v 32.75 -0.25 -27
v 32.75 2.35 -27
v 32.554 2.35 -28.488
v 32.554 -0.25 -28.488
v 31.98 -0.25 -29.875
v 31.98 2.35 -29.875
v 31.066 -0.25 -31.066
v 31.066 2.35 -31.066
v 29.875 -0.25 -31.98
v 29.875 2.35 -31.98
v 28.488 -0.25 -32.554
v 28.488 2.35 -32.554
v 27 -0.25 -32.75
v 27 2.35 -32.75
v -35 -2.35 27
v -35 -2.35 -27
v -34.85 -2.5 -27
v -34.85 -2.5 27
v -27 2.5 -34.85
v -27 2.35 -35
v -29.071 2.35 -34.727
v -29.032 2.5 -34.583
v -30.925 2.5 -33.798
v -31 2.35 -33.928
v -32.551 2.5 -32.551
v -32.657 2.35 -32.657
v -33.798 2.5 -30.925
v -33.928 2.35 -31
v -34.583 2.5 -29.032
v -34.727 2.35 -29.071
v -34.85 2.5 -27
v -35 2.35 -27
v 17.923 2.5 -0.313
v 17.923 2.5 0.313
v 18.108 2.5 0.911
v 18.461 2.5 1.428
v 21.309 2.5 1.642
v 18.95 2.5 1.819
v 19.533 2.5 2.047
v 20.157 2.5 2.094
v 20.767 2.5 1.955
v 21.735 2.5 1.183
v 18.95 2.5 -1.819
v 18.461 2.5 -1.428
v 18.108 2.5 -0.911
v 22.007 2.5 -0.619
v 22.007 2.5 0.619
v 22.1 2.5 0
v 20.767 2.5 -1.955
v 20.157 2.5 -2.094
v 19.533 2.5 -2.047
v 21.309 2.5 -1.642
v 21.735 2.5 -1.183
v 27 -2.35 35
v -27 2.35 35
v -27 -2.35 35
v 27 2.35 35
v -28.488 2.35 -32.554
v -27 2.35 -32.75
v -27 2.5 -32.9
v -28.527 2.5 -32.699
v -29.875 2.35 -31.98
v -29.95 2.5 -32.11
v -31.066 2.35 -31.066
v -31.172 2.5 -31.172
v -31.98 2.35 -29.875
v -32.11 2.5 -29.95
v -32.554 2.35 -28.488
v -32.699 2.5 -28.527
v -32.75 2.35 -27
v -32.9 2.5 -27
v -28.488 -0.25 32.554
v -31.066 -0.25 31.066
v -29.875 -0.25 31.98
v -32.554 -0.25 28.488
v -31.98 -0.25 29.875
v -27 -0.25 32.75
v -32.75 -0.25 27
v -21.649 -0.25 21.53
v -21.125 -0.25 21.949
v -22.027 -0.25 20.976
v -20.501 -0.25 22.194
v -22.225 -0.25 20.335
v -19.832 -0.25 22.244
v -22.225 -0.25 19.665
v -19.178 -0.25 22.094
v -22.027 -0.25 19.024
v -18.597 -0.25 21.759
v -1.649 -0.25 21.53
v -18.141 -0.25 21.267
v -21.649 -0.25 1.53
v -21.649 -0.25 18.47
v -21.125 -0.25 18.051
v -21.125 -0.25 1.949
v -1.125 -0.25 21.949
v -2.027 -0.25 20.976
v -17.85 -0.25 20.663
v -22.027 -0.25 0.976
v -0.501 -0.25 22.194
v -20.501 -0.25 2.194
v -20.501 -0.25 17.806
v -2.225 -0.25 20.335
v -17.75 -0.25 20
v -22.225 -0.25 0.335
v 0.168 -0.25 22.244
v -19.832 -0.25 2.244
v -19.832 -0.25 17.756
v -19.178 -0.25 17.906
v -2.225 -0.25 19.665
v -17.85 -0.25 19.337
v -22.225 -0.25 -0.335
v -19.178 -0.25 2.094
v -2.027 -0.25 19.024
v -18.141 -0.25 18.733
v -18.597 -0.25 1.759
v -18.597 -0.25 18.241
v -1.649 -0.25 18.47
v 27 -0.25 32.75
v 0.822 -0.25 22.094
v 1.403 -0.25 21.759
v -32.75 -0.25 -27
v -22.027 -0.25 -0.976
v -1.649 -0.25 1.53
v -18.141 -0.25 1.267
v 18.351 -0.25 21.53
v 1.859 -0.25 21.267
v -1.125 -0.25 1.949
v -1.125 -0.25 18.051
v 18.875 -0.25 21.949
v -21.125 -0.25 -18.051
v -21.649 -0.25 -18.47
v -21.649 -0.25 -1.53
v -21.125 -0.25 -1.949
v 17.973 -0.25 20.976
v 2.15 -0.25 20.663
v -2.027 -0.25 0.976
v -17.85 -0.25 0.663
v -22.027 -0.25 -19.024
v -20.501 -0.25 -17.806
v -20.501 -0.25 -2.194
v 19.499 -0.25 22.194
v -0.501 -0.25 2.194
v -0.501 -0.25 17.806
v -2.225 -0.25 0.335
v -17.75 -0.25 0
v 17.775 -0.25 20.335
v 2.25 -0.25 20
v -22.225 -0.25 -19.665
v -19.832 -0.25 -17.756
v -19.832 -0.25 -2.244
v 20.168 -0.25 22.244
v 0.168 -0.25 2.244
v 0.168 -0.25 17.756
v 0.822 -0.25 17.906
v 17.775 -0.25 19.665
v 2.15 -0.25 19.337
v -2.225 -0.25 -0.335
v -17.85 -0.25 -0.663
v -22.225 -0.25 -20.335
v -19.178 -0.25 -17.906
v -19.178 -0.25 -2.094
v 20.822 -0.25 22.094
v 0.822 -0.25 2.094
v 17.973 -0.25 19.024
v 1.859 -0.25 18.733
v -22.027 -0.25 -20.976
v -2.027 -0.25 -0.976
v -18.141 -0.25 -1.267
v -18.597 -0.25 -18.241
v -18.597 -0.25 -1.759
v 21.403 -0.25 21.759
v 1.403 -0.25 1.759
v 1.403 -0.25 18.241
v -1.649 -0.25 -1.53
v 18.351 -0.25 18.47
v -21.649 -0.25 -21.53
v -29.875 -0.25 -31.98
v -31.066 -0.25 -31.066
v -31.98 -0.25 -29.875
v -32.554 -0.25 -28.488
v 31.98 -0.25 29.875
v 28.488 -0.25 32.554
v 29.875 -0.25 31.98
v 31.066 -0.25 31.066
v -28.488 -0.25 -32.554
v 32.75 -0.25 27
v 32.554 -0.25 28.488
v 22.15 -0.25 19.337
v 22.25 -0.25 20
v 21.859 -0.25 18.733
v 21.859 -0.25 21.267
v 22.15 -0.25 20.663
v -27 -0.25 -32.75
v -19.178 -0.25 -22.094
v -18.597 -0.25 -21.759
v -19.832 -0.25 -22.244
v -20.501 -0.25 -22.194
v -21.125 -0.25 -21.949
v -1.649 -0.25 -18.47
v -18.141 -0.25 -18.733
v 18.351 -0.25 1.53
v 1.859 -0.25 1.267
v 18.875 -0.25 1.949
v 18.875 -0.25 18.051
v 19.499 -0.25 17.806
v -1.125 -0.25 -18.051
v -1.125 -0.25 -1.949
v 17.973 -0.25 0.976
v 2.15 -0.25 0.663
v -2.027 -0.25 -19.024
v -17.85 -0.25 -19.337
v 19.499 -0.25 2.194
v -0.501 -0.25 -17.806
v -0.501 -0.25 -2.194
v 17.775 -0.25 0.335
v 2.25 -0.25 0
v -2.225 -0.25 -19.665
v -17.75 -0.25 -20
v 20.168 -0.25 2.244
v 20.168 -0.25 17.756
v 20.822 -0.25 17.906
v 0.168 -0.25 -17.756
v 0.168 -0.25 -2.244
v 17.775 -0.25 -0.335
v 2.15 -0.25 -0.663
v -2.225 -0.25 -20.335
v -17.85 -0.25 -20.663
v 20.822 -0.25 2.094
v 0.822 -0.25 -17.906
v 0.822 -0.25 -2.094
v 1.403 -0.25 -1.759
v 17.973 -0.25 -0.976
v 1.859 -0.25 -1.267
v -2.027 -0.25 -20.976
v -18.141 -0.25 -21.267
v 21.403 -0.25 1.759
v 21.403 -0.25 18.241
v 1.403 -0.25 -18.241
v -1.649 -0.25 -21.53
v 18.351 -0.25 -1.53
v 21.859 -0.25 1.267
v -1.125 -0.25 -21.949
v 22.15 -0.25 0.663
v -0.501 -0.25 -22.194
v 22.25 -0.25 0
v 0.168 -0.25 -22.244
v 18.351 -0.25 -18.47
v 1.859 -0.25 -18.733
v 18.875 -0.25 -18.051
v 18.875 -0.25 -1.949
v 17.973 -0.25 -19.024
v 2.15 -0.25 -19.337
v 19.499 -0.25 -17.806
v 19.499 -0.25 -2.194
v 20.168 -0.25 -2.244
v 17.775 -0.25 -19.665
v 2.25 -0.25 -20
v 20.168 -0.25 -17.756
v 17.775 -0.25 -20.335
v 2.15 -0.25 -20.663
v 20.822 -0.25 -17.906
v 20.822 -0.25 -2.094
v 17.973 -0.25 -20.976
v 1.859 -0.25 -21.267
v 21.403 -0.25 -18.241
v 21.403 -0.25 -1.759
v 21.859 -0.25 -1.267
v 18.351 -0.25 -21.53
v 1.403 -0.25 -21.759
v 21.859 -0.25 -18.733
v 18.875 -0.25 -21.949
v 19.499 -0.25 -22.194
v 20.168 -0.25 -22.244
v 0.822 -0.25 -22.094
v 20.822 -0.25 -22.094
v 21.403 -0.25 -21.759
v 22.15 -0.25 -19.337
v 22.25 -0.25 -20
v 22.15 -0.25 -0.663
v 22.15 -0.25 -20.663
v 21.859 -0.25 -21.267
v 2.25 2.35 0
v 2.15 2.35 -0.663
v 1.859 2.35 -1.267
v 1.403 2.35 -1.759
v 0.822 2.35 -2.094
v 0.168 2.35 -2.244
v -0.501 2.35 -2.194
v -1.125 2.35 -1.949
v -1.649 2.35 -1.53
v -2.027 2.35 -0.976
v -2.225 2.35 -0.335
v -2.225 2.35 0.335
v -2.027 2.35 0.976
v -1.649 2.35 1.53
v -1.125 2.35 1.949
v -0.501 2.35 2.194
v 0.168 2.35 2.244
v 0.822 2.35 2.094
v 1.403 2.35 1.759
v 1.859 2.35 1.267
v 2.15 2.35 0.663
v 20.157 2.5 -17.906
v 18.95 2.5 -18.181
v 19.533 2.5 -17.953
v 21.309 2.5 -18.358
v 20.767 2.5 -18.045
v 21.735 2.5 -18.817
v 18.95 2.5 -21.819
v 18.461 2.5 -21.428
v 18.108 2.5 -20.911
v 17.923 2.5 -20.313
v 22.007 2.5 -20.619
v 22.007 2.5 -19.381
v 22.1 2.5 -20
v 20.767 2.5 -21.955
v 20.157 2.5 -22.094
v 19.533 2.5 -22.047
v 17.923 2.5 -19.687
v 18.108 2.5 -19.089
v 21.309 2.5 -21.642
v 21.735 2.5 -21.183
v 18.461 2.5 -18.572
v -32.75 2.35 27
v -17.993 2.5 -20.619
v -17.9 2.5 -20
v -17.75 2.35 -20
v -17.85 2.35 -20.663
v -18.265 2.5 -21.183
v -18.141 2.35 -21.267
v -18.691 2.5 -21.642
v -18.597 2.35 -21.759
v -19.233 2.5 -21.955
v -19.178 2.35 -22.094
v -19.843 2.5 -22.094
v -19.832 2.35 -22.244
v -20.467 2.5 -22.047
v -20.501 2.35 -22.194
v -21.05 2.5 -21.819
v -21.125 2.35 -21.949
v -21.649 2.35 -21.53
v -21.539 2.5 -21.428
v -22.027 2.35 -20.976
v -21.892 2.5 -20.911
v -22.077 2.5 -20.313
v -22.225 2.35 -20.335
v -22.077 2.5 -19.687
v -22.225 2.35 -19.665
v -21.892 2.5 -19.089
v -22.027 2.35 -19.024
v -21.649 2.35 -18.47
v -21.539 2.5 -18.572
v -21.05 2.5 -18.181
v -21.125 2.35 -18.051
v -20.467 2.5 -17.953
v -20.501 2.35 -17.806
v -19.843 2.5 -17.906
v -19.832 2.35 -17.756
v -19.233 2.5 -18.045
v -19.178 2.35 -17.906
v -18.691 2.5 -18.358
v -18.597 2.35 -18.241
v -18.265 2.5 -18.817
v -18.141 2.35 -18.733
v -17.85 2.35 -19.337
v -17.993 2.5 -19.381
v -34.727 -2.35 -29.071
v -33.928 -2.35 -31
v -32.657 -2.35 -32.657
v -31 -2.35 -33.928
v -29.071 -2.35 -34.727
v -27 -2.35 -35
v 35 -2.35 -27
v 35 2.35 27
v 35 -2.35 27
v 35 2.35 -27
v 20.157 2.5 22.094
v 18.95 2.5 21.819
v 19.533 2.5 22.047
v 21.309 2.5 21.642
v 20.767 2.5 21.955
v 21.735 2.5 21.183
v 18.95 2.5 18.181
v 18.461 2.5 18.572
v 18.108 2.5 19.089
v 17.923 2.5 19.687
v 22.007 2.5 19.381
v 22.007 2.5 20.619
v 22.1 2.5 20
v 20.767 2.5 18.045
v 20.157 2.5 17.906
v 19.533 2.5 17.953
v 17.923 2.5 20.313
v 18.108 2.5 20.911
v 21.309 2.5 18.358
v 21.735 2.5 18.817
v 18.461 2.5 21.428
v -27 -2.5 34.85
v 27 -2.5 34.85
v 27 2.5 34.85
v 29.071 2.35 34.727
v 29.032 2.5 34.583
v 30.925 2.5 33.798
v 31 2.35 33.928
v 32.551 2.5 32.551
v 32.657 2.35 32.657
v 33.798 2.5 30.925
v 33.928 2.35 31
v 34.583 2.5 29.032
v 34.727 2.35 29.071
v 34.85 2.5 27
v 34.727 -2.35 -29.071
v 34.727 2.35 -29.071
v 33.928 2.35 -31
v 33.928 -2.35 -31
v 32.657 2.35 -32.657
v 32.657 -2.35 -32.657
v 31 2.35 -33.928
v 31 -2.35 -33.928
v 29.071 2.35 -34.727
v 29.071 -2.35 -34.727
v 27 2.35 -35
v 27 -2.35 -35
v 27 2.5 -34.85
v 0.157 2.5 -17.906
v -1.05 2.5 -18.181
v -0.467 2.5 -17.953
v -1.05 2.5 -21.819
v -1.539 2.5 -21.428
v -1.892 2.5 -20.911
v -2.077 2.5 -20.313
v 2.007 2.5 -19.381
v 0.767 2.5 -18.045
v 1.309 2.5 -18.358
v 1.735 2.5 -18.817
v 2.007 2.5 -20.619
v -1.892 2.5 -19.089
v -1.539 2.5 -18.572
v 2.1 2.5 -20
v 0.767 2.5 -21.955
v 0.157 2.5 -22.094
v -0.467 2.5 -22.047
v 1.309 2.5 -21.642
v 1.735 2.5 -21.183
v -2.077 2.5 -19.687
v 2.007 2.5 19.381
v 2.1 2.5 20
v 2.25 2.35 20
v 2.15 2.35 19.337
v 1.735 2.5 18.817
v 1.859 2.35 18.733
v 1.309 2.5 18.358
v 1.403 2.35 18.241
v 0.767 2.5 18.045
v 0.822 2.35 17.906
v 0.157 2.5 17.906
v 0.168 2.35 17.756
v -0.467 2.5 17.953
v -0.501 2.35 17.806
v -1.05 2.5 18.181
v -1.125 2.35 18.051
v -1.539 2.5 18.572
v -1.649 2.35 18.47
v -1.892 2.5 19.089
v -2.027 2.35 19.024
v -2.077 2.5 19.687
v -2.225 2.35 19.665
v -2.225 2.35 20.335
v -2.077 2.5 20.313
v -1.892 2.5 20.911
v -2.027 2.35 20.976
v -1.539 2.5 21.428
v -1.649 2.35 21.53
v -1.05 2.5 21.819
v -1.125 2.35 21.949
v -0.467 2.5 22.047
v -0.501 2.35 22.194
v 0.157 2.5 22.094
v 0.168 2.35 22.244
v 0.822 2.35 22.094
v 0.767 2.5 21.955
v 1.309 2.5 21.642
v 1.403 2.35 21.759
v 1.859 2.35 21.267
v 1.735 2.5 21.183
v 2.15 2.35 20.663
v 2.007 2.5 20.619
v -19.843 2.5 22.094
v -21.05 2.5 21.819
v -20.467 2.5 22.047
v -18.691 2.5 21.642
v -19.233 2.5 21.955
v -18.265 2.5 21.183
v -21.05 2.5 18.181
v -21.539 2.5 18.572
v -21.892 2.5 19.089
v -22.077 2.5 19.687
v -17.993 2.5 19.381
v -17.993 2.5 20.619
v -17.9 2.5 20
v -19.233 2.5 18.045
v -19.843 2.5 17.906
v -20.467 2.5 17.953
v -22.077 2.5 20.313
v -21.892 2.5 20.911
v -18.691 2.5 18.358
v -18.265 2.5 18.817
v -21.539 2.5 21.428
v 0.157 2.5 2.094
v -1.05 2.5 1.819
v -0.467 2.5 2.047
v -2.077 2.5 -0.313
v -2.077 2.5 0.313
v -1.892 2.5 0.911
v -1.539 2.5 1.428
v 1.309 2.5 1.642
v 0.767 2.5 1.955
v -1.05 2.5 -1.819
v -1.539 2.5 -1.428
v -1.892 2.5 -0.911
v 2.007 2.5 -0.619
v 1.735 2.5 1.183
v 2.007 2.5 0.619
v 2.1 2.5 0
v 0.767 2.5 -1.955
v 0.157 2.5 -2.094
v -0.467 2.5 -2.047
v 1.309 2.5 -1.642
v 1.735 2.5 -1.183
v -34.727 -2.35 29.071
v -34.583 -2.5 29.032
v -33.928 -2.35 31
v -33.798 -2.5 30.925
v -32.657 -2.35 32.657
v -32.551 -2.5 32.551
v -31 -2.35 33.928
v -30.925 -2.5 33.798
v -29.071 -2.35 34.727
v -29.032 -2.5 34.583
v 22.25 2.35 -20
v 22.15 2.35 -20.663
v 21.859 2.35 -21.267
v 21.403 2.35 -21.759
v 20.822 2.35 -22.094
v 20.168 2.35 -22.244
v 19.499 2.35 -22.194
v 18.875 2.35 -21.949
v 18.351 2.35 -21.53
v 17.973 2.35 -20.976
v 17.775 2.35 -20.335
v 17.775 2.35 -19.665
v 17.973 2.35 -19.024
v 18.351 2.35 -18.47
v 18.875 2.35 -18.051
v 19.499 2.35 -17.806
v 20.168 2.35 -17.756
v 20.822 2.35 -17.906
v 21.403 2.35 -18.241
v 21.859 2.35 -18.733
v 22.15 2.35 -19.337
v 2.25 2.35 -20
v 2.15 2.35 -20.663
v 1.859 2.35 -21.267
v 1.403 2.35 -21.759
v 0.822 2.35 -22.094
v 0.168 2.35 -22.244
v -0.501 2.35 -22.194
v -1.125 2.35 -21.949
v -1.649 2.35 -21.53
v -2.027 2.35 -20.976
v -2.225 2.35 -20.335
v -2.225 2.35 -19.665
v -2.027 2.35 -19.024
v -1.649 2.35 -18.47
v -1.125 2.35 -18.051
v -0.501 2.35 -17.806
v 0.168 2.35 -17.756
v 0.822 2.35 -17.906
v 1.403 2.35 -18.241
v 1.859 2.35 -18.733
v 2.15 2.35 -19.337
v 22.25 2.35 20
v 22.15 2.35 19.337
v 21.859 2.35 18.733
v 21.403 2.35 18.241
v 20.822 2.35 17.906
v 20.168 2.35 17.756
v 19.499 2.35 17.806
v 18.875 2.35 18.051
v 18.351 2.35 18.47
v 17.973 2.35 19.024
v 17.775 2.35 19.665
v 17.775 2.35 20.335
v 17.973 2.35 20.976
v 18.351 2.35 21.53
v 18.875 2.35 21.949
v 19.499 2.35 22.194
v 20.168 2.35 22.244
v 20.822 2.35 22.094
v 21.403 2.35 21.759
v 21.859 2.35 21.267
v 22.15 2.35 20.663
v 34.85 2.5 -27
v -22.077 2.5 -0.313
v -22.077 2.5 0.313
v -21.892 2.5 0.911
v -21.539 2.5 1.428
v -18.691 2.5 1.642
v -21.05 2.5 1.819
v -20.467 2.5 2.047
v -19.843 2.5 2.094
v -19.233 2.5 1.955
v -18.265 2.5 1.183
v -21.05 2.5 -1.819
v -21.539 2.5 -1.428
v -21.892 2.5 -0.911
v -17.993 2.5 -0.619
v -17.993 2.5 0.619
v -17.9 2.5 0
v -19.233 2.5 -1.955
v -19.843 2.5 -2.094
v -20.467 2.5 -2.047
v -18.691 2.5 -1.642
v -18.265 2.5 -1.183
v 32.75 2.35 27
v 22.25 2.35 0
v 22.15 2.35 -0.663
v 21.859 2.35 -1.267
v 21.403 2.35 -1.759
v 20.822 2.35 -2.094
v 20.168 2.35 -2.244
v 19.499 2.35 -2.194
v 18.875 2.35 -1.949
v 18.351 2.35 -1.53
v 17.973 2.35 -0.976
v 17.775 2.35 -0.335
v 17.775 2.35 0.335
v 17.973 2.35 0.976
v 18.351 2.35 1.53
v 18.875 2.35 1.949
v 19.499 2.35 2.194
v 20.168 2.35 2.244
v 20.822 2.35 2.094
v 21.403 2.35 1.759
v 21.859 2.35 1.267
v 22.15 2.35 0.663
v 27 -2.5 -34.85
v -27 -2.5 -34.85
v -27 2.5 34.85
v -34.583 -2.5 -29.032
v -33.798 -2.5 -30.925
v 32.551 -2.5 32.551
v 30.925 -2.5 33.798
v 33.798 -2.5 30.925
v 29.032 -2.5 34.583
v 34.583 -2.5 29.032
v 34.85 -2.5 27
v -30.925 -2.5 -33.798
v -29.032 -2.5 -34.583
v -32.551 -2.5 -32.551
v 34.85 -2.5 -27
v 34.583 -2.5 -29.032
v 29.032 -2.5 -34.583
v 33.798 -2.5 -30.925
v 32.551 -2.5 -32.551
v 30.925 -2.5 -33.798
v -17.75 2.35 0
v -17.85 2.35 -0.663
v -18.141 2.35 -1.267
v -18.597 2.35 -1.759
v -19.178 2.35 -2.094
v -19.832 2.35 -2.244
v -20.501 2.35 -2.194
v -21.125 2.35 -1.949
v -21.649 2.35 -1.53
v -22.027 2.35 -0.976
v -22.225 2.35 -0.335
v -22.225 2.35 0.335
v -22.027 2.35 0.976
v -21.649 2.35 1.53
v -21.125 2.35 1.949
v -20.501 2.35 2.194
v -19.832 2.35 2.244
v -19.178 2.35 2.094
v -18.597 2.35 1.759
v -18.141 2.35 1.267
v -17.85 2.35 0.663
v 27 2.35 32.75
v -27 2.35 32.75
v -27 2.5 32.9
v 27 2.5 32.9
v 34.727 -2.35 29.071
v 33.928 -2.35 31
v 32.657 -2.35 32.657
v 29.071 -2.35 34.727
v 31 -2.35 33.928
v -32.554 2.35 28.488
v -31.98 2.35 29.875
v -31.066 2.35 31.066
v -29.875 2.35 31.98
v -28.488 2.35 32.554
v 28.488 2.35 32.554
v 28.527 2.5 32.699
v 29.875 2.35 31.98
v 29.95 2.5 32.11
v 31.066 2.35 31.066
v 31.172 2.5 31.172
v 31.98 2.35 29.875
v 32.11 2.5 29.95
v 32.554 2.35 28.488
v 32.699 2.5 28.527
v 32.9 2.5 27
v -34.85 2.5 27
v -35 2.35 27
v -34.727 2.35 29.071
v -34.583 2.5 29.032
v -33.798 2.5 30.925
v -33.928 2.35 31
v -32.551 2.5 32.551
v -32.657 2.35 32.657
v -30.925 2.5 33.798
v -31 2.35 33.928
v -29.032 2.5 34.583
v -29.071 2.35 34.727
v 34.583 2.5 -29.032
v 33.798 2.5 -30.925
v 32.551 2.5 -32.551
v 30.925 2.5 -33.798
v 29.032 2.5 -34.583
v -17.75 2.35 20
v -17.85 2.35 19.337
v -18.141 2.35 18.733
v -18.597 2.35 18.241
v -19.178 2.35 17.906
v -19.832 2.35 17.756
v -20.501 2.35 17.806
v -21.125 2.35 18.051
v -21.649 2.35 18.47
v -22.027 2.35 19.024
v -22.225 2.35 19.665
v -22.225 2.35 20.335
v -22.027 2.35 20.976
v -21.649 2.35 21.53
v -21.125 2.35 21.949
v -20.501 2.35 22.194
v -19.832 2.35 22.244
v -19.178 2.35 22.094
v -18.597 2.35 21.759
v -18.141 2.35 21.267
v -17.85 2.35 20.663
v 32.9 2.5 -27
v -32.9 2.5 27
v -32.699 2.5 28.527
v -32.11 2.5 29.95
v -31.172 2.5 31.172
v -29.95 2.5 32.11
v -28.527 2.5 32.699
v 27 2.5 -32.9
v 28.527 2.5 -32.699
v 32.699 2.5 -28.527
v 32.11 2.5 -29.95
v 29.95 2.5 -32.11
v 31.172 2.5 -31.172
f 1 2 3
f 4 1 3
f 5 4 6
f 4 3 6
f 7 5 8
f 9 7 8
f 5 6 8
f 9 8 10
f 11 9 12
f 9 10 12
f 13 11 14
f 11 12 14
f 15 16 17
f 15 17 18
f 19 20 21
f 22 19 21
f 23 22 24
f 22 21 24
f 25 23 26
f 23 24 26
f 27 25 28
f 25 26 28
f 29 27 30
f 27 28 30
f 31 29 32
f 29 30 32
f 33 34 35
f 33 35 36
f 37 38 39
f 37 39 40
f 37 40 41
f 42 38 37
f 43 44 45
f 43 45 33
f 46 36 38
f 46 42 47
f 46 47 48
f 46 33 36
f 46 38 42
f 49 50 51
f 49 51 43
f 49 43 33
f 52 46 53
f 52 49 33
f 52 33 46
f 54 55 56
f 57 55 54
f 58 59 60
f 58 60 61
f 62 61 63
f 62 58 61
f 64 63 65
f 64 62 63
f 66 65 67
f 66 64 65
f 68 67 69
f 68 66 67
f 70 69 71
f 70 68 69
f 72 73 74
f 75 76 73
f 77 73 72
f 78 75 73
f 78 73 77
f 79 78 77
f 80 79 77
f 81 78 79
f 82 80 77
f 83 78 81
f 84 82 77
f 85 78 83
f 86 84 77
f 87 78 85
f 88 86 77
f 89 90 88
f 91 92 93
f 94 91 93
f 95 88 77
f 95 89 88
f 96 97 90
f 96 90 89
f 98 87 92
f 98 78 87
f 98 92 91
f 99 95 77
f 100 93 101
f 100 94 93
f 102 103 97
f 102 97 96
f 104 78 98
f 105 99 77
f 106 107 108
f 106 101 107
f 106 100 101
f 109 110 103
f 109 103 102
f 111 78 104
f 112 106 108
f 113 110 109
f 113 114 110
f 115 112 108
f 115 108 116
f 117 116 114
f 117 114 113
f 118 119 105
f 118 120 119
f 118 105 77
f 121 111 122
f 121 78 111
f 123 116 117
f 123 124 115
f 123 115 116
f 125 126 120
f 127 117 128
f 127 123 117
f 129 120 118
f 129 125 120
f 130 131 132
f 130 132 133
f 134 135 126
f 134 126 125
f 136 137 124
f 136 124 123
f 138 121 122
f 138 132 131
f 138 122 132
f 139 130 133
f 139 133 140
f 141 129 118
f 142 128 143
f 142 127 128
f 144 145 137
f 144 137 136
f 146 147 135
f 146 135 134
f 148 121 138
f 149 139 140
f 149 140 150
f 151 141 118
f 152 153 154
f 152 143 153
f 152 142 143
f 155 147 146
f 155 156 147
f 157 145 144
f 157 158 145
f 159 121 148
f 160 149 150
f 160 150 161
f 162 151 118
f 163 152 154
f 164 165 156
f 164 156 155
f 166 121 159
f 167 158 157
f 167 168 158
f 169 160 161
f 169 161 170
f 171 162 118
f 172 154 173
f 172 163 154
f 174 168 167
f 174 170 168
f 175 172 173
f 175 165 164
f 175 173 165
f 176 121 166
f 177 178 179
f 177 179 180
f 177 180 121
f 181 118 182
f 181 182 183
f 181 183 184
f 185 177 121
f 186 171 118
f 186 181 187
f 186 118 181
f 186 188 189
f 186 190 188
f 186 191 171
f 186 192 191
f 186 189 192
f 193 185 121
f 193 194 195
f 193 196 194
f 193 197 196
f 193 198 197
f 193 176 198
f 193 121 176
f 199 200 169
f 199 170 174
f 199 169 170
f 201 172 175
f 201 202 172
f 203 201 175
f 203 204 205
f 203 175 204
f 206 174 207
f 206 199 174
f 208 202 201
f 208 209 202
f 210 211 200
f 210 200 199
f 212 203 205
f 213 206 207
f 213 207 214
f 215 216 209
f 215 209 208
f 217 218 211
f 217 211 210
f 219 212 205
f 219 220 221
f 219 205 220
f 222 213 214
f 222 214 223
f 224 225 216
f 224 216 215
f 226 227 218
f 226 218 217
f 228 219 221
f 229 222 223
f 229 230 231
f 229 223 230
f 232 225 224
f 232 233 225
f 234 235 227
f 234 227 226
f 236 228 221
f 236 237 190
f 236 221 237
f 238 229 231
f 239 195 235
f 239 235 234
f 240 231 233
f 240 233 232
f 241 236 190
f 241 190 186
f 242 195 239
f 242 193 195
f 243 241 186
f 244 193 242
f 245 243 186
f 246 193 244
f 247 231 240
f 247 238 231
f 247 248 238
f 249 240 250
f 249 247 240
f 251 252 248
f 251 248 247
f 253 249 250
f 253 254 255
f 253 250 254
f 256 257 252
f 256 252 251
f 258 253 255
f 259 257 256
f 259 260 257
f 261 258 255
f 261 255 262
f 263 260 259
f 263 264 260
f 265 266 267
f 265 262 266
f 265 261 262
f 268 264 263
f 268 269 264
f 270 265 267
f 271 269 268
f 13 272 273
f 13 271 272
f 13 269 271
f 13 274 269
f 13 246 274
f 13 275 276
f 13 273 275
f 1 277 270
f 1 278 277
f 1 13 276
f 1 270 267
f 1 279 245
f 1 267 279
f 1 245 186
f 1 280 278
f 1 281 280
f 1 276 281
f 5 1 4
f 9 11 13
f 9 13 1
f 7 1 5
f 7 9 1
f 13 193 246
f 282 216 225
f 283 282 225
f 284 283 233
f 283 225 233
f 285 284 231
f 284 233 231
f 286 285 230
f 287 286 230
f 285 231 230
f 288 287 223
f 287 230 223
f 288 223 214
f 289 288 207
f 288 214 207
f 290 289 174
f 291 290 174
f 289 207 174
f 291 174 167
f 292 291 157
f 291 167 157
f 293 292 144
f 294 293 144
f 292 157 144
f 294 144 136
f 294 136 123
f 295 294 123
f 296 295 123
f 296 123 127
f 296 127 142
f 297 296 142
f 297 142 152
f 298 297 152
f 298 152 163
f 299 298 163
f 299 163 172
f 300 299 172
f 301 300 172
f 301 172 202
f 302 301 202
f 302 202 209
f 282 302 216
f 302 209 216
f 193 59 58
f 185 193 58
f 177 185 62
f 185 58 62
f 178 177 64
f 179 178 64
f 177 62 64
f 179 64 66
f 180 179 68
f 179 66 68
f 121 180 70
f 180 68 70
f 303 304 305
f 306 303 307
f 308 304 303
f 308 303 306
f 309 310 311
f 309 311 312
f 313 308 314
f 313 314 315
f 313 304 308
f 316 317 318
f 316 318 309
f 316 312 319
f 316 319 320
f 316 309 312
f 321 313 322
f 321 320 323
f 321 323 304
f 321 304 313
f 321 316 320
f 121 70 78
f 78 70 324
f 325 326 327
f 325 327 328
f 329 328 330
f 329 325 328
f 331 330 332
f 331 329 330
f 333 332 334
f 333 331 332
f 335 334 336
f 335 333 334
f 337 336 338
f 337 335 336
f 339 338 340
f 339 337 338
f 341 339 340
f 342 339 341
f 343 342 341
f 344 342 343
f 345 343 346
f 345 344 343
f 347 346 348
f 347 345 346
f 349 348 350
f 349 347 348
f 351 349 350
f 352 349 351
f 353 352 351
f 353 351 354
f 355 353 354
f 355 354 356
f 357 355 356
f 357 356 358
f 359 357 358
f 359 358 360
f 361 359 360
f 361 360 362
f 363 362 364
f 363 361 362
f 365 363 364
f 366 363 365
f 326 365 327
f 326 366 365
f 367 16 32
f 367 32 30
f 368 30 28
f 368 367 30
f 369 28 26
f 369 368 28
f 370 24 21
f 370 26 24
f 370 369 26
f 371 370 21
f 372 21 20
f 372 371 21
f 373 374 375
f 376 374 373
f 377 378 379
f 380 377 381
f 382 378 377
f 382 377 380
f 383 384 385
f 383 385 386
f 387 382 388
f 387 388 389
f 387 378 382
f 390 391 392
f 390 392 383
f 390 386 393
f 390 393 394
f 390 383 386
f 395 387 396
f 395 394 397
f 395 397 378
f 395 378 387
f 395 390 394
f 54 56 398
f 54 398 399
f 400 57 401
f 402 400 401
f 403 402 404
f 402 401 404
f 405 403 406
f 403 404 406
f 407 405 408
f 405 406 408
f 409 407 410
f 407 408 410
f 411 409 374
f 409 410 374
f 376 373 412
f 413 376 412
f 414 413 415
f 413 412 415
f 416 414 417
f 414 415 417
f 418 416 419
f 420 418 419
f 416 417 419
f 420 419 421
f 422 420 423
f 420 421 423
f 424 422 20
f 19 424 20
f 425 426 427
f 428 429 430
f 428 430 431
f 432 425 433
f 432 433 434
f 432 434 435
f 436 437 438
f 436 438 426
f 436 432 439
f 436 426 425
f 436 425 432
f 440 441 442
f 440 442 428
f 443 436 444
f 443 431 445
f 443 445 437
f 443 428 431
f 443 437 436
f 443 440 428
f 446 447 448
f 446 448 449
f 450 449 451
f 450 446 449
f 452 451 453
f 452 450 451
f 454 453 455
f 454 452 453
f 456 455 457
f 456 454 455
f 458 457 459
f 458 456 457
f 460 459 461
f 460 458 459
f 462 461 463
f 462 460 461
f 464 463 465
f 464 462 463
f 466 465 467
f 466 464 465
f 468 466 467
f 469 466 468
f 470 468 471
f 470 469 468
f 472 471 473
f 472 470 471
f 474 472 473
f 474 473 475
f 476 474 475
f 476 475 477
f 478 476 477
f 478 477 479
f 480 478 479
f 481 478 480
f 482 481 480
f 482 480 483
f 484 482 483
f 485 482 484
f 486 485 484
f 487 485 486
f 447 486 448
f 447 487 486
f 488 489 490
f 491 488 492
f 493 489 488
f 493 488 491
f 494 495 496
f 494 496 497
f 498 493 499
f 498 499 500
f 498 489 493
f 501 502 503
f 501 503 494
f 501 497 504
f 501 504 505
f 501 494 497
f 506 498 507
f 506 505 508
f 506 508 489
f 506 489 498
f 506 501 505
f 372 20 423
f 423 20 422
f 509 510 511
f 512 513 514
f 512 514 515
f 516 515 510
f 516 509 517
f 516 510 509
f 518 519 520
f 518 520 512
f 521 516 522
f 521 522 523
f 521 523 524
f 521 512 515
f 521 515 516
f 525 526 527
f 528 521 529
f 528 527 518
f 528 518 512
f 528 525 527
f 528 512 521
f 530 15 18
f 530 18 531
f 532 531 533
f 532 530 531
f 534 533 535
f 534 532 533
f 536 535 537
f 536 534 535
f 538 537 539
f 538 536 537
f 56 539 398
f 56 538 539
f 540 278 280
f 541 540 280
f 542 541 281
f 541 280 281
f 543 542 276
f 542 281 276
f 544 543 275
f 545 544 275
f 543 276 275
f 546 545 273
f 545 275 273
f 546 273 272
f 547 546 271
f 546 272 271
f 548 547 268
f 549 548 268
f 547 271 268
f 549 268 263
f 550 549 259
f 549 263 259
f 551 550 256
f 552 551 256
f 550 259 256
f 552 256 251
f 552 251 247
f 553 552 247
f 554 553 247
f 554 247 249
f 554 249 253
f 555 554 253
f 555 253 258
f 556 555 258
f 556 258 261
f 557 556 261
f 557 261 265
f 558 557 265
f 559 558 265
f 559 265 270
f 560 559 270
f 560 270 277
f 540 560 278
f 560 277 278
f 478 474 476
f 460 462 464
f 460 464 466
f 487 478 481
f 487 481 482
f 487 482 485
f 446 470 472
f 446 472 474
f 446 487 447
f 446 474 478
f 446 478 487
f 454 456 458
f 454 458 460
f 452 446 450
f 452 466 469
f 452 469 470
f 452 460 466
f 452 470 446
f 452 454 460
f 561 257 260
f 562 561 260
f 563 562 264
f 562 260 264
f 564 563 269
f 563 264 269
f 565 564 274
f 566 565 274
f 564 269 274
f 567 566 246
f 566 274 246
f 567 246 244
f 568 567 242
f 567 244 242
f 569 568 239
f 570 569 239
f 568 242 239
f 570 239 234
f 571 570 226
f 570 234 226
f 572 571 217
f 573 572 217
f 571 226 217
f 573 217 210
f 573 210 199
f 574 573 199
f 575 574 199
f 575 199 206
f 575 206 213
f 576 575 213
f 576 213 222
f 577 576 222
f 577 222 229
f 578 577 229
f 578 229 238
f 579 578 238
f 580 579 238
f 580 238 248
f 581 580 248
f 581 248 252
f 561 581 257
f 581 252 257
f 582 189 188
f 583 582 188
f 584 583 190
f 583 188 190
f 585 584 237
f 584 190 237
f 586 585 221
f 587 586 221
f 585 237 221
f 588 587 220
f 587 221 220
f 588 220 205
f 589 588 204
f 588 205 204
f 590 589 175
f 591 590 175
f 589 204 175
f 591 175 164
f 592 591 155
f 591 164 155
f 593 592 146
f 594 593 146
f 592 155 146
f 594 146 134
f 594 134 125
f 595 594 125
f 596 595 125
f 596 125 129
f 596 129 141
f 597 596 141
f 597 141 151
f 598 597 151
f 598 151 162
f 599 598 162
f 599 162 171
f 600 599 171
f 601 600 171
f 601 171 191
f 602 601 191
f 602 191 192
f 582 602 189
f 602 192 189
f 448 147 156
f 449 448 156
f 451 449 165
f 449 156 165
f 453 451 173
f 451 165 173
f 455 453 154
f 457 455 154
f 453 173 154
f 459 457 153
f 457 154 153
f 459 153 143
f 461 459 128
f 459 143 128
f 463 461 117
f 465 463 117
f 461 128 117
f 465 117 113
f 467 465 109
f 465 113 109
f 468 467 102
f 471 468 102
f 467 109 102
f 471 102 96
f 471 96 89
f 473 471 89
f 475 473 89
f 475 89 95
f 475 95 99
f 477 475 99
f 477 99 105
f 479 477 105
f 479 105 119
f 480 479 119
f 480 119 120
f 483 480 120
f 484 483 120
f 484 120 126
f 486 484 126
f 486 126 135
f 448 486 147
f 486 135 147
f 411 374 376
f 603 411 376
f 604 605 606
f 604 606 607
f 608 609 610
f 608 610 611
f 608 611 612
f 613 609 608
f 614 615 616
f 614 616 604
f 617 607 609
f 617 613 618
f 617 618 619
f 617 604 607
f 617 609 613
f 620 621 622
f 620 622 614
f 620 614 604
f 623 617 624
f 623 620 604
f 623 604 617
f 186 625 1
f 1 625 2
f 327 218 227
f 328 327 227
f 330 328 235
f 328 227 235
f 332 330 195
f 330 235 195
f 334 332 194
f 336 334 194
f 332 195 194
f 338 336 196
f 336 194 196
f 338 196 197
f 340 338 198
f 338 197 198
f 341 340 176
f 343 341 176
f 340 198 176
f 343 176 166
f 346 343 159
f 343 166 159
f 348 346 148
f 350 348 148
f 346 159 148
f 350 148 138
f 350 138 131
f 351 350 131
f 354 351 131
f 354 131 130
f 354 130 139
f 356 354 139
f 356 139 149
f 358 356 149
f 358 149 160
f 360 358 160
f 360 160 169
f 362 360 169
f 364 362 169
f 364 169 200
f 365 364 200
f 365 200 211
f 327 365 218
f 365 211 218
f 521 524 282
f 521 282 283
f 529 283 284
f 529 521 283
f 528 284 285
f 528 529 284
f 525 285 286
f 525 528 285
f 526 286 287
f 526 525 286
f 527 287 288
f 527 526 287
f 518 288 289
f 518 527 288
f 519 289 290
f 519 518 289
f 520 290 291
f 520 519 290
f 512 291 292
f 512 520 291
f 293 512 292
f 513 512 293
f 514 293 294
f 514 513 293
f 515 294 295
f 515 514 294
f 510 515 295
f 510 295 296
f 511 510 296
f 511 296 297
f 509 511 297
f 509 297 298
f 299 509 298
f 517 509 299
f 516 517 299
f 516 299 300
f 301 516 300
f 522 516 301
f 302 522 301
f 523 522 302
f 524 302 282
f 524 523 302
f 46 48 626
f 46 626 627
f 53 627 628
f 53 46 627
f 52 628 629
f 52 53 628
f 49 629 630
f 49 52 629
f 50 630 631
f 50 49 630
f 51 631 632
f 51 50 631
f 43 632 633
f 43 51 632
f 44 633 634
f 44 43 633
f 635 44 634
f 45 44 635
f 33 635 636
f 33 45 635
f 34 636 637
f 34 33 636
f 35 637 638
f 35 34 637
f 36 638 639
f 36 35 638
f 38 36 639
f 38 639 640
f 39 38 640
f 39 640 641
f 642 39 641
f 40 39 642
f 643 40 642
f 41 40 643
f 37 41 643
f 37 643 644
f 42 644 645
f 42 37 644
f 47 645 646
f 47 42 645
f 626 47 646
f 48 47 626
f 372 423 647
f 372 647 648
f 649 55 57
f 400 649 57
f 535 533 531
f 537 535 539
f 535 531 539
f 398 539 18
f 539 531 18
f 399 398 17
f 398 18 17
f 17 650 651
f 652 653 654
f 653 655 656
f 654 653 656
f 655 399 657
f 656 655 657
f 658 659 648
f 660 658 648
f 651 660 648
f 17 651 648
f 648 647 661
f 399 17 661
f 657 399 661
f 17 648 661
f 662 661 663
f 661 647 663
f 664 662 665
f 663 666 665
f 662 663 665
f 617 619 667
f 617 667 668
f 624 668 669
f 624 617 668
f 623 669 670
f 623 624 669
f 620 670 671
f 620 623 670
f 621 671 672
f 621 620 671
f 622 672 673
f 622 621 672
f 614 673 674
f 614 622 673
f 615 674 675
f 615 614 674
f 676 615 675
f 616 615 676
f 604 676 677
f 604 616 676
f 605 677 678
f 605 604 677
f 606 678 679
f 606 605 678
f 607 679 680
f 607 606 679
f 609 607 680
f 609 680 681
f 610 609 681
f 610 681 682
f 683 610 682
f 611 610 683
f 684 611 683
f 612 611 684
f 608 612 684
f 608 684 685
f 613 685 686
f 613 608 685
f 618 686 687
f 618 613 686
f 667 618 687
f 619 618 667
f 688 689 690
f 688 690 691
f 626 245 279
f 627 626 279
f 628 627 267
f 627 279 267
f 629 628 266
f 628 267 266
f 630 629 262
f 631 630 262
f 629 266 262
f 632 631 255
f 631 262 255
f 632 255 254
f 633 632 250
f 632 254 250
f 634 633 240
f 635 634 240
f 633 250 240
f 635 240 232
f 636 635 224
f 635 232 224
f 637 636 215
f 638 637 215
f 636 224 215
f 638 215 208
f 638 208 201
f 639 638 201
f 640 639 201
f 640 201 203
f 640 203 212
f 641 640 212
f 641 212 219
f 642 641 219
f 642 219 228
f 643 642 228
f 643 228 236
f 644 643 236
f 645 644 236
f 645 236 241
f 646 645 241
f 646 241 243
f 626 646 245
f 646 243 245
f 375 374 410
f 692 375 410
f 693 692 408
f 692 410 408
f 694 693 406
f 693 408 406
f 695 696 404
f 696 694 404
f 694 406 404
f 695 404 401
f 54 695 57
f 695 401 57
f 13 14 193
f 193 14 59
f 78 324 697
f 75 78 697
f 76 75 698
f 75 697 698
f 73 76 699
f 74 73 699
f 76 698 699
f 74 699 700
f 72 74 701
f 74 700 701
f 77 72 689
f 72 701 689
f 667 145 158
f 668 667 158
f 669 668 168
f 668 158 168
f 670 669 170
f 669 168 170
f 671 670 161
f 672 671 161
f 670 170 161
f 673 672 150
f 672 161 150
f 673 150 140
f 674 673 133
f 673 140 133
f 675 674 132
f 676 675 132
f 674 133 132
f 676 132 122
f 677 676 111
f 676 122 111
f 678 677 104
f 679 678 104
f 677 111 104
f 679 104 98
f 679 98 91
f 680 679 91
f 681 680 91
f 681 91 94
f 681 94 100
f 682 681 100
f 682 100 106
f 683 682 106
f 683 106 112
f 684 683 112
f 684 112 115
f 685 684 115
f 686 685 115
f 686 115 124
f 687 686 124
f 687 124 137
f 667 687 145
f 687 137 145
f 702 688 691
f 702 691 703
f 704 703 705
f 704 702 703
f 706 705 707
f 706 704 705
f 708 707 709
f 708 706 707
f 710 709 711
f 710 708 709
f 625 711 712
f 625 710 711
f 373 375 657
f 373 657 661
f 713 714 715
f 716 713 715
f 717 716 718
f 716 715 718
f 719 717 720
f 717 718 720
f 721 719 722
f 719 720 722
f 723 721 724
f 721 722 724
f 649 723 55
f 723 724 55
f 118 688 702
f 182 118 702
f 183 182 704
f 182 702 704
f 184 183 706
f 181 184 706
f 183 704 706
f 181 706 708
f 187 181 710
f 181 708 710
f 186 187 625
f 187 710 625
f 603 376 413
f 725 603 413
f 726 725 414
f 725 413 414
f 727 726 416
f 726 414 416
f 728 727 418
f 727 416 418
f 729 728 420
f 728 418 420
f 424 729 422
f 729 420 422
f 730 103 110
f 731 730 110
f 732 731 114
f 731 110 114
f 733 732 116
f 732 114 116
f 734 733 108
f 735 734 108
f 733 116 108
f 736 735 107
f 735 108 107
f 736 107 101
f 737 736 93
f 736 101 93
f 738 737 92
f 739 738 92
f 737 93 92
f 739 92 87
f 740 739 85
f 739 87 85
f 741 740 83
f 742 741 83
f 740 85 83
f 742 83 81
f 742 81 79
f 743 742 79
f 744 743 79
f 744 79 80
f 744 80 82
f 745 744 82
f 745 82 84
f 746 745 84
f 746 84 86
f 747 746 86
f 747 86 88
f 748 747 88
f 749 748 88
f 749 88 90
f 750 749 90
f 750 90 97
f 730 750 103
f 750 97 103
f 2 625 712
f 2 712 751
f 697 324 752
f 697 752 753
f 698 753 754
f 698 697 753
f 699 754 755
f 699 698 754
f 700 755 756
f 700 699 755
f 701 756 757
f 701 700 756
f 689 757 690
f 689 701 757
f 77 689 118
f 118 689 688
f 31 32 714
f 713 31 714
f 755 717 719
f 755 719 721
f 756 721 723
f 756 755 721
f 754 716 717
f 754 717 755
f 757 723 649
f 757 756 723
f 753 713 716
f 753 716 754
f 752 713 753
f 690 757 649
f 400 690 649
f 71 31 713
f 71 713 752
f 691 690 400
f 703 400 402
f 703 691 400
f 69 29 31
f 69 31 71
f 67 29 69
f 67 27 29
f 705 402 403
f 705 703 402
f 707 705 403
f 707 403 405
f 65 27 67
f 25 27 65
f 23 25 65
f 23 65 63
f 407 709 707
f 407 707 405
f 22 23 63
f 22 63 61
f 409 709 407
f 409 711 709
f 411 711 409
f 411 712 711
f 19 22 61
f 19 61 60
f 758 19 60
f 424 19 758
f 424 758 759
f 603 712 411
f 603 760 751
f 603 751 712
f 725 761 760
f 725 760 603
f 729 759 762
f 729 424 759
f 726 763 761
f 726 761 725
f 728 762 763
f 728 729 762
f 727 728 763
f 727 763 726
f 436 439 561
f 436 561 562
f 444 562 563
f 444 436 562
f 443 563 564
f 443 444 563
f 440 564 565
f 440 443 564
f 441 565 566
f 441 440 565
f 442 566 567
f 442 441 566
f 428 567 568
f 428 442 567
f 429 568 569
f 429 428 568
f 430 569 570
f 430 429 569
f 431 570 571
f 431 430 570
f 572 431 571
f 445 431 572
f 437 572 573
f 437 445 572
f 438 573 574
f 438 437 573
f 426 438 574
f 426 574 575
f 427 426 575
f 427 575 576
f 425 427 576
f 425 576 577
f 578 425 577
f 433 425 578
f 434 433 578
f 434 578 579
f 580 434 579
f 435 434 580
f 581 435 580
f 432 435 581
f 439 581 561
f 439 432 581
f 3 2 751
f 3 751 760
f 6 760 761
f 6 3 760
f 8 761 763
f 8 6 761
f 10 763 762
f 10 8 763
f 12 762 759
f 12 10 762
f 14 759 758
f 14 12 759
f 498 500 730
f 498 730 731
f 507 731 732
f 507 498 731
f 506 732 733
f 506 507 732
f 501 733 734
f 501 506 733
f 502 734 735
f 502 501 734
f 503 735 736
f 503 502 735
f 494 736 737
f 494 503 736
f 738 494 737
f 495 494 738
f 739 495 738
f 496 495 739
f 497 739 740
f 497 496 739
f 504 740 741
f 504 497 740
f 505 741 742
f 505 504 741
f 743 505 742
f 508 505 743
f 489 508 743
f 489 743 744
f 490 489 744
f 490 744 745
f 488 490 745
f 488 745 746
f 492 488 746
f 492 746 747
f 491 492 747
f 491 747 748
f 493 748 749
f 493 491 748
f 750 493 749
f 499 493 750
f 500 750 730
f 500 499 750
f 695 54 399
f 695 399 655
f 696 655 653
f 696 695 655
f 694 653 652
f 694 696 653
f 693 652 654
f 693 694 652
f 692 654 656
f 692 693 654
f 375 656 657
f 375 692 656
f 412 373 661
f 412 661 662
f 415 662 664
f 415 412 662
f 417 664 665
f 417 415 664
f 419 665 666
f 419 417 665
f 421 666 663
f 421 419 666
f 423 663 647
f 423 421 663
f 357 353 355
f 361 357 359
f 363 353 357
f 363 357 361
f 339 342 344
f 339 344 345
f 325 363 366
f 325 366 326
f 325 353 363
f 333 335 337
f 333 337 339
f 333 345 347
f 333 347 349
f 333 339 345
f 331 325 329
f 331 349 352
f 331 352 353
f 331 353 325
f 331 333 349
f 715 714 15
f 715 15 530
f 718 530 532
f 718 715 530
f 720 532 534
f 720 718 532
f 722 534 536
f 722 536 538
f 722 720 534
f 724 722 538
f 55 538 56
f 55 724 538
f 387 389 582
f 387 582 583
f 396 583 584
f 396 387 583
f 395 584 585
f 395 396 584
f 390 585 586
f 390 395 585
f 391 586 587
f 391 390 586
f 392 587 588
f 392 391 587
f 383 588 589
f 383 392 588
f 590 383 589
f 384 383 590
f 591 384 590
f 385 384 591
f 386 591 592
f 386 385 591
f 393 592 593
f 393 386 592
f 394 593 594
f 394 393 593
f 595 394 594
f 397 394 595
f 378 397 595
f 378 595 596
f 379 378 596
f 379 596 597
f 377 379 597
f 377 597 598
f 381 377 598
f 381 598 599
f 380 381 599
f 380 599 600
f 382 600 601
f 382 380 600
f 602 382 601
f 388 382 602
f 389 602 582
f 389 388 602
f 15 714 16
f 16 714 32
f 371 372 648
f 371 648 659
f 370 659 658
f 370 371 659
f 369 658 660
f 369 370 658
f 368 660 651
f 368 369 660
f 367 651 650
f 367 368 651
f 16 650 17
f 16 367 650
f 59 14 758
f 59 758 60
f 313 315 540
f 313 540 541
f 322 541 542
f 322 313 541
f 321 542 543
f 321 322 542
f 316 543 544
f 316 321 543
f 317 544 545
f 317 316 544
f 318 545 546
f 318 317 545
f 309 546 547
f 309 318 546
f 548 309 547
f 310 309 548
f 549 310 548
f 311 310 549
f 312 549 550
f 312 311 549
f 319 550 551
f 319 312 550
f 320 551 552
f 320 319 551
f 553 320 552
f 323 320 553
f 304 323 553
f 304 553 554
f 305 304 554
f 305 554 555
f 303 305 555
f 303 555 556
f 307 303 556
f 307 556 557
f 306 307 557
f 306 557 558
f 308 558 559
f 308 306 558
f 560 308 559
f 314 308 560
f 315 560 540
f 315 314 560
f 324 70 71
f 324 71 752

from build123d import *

# Parameters (mm, degrees)
SKETCH1_W           = 70
SKETCH1_H           = 70
BOSS_EXTRUDE1_DEPTH = 2.5
FILLET1_R           = 8
CUT_EXTRUDE1_DEPTH  = 2.75
SKETCH3_R           = 2.25
BOSS_EXTRUDE2_DEPTH = 2.75
CHAMFER1_SIZE       = 0.15


with BuildPart() as part:
    # Sketch1 → Boss-Extrude1 (new body, symmetric)
    with BuildSketch(Plane(origin=(0, 0, 0), x_dir=(1, 0, 0), z_dir=(0, 1, 0))):
        Rectangle(SKETCH1_W, SKETCH1_H)
    extrude(amount=BOSS_EXTRUDE1_DEPTH, both=True)

    # Fillet1
    fillet1_edges = [part.edges().sort_by_distance(p)[0] for p in [
        (35, 0, 35),
        (-35, 0, 35),
        (-35, 0, -35),
        (35, 0, -35),
    ]]
    fillet(fillet1_edges, radius=FILLET1_R)

    # Sketch2 → Cut-Extrude1 (cut)
    with BuildSketch(Plane(origin=(0, 2.5, 0), x_dir=(1, 0, 0), z_dir=(0, 1, 0))):
        with BuildLine():
            Line((32.75, -27), (32.75, 27))
            ThreePointArc((32.75, 27), (31.065863992, 31.065863992), (27, 32.75))
            Line((27, 32.75), (-27, 32.75))
            ThreePointArc((-27, 32.75), (-31.065863992, 31.065863992), (-32.75, 27))
            Line((-32.75, 27), (-32.75, -27))
            ThreePointArc((-32.75, -27), (-31.065863992, -31.065863992), (-27, -32.75))
            Line((-27, -32.75), (27, -32.75))
            ThreePointArc((27, -32.75), (31.065863992, -31.065863992), (32.75, -27))
        make_face()
    extrude(amount=-CUT_EXTRUDE1_DEPTH, mode=Mode.SUBTRACT)

    # Sketch3 → Boss-Extrude2 (add)
    with BuildSketch(Plane(origin=(0, -0.25, 0), x_dir=(1, 0, 0), z_dir=(0, 1, 0))):
        with Locations((-20, 20)):
            Circle(SKETCH3_R)
        with Locations((0, 20)):
            Circle(SKETCH3_R)
        with Locations((20, 20)):
            Circle(SKETCH3_R)
        Circle(SKETCH3_R)
        with Locations((20, 0)):
            Circle(SKETCH3_R)
        with Locations((0, -20)):
            Circle(SKETCH3_R)
        with Locations((20, -20)):
            Circle(SKETCH3_R)
        with Locations((-20, 0)):
            Circle(SKETCH3_R)
        with Locations((-20, -20)):
            Circle(SKETCH3_R)
    extrude(amount=BOSS_EXTRUDE2_DEPTH)

    # Chamfer1
    chamfer1_edges = [part.edges().sort_by_distance(p)[0] for p in [
        (35, 2.5, 0),
        (35, -2.5, 0),
        (0, 2.5, -35),
        (-35, 2.5, 0),
        (0, 2.5, 35),
        (-32.656854249, 2.5, 32.656854249),
        (-32.656854249, 2.5, -32.656854249),
        (32.656854249, 2.5, 32.656854249),
        (32.656854249, 2.5, -32.656854249),
        (0, -2.5, -35),
        (0, -2.5, 35),
        (-35, -2.5, 0),
        (-32.656854249, -2.5, 32.656854249),
        (-32.656854249, -2.5, -32.656854249),
        (32.656854249, -2.5, 32.656854249),
        (32.656854249, -2.5, -32.656854249),
        (31.065863992, 2.5, -31.065863992),
        (0, 2.5, -32.75),
        (-31.065863992, 2.5, -31.065863992),
        (-32.75, 2.5, 0),
        (-31.065863992, 2.5, 31.065863992),
        (0, 2.5, 32.75),
        (31.065863992, 2.5, 31.065863992),
        (32.75, 2.5, 0),
        (-22.25, 2.5, -20),
        (-2.25, 2.5, -20),
        (17.75, 2.5, -20),
        (-2.25, 2.5, 0),
        (17.75, 2.5, 0),
        (-2.25, 2.5, 20),
        (17.75, 2.5, 20),
        (-22.25, 2.5, 0),
        (-22.25, 2.5, 20),
    ]]
    chamfer(chamfer1_edges, length=CHAMFER1_SIZE)


solid = part.part
